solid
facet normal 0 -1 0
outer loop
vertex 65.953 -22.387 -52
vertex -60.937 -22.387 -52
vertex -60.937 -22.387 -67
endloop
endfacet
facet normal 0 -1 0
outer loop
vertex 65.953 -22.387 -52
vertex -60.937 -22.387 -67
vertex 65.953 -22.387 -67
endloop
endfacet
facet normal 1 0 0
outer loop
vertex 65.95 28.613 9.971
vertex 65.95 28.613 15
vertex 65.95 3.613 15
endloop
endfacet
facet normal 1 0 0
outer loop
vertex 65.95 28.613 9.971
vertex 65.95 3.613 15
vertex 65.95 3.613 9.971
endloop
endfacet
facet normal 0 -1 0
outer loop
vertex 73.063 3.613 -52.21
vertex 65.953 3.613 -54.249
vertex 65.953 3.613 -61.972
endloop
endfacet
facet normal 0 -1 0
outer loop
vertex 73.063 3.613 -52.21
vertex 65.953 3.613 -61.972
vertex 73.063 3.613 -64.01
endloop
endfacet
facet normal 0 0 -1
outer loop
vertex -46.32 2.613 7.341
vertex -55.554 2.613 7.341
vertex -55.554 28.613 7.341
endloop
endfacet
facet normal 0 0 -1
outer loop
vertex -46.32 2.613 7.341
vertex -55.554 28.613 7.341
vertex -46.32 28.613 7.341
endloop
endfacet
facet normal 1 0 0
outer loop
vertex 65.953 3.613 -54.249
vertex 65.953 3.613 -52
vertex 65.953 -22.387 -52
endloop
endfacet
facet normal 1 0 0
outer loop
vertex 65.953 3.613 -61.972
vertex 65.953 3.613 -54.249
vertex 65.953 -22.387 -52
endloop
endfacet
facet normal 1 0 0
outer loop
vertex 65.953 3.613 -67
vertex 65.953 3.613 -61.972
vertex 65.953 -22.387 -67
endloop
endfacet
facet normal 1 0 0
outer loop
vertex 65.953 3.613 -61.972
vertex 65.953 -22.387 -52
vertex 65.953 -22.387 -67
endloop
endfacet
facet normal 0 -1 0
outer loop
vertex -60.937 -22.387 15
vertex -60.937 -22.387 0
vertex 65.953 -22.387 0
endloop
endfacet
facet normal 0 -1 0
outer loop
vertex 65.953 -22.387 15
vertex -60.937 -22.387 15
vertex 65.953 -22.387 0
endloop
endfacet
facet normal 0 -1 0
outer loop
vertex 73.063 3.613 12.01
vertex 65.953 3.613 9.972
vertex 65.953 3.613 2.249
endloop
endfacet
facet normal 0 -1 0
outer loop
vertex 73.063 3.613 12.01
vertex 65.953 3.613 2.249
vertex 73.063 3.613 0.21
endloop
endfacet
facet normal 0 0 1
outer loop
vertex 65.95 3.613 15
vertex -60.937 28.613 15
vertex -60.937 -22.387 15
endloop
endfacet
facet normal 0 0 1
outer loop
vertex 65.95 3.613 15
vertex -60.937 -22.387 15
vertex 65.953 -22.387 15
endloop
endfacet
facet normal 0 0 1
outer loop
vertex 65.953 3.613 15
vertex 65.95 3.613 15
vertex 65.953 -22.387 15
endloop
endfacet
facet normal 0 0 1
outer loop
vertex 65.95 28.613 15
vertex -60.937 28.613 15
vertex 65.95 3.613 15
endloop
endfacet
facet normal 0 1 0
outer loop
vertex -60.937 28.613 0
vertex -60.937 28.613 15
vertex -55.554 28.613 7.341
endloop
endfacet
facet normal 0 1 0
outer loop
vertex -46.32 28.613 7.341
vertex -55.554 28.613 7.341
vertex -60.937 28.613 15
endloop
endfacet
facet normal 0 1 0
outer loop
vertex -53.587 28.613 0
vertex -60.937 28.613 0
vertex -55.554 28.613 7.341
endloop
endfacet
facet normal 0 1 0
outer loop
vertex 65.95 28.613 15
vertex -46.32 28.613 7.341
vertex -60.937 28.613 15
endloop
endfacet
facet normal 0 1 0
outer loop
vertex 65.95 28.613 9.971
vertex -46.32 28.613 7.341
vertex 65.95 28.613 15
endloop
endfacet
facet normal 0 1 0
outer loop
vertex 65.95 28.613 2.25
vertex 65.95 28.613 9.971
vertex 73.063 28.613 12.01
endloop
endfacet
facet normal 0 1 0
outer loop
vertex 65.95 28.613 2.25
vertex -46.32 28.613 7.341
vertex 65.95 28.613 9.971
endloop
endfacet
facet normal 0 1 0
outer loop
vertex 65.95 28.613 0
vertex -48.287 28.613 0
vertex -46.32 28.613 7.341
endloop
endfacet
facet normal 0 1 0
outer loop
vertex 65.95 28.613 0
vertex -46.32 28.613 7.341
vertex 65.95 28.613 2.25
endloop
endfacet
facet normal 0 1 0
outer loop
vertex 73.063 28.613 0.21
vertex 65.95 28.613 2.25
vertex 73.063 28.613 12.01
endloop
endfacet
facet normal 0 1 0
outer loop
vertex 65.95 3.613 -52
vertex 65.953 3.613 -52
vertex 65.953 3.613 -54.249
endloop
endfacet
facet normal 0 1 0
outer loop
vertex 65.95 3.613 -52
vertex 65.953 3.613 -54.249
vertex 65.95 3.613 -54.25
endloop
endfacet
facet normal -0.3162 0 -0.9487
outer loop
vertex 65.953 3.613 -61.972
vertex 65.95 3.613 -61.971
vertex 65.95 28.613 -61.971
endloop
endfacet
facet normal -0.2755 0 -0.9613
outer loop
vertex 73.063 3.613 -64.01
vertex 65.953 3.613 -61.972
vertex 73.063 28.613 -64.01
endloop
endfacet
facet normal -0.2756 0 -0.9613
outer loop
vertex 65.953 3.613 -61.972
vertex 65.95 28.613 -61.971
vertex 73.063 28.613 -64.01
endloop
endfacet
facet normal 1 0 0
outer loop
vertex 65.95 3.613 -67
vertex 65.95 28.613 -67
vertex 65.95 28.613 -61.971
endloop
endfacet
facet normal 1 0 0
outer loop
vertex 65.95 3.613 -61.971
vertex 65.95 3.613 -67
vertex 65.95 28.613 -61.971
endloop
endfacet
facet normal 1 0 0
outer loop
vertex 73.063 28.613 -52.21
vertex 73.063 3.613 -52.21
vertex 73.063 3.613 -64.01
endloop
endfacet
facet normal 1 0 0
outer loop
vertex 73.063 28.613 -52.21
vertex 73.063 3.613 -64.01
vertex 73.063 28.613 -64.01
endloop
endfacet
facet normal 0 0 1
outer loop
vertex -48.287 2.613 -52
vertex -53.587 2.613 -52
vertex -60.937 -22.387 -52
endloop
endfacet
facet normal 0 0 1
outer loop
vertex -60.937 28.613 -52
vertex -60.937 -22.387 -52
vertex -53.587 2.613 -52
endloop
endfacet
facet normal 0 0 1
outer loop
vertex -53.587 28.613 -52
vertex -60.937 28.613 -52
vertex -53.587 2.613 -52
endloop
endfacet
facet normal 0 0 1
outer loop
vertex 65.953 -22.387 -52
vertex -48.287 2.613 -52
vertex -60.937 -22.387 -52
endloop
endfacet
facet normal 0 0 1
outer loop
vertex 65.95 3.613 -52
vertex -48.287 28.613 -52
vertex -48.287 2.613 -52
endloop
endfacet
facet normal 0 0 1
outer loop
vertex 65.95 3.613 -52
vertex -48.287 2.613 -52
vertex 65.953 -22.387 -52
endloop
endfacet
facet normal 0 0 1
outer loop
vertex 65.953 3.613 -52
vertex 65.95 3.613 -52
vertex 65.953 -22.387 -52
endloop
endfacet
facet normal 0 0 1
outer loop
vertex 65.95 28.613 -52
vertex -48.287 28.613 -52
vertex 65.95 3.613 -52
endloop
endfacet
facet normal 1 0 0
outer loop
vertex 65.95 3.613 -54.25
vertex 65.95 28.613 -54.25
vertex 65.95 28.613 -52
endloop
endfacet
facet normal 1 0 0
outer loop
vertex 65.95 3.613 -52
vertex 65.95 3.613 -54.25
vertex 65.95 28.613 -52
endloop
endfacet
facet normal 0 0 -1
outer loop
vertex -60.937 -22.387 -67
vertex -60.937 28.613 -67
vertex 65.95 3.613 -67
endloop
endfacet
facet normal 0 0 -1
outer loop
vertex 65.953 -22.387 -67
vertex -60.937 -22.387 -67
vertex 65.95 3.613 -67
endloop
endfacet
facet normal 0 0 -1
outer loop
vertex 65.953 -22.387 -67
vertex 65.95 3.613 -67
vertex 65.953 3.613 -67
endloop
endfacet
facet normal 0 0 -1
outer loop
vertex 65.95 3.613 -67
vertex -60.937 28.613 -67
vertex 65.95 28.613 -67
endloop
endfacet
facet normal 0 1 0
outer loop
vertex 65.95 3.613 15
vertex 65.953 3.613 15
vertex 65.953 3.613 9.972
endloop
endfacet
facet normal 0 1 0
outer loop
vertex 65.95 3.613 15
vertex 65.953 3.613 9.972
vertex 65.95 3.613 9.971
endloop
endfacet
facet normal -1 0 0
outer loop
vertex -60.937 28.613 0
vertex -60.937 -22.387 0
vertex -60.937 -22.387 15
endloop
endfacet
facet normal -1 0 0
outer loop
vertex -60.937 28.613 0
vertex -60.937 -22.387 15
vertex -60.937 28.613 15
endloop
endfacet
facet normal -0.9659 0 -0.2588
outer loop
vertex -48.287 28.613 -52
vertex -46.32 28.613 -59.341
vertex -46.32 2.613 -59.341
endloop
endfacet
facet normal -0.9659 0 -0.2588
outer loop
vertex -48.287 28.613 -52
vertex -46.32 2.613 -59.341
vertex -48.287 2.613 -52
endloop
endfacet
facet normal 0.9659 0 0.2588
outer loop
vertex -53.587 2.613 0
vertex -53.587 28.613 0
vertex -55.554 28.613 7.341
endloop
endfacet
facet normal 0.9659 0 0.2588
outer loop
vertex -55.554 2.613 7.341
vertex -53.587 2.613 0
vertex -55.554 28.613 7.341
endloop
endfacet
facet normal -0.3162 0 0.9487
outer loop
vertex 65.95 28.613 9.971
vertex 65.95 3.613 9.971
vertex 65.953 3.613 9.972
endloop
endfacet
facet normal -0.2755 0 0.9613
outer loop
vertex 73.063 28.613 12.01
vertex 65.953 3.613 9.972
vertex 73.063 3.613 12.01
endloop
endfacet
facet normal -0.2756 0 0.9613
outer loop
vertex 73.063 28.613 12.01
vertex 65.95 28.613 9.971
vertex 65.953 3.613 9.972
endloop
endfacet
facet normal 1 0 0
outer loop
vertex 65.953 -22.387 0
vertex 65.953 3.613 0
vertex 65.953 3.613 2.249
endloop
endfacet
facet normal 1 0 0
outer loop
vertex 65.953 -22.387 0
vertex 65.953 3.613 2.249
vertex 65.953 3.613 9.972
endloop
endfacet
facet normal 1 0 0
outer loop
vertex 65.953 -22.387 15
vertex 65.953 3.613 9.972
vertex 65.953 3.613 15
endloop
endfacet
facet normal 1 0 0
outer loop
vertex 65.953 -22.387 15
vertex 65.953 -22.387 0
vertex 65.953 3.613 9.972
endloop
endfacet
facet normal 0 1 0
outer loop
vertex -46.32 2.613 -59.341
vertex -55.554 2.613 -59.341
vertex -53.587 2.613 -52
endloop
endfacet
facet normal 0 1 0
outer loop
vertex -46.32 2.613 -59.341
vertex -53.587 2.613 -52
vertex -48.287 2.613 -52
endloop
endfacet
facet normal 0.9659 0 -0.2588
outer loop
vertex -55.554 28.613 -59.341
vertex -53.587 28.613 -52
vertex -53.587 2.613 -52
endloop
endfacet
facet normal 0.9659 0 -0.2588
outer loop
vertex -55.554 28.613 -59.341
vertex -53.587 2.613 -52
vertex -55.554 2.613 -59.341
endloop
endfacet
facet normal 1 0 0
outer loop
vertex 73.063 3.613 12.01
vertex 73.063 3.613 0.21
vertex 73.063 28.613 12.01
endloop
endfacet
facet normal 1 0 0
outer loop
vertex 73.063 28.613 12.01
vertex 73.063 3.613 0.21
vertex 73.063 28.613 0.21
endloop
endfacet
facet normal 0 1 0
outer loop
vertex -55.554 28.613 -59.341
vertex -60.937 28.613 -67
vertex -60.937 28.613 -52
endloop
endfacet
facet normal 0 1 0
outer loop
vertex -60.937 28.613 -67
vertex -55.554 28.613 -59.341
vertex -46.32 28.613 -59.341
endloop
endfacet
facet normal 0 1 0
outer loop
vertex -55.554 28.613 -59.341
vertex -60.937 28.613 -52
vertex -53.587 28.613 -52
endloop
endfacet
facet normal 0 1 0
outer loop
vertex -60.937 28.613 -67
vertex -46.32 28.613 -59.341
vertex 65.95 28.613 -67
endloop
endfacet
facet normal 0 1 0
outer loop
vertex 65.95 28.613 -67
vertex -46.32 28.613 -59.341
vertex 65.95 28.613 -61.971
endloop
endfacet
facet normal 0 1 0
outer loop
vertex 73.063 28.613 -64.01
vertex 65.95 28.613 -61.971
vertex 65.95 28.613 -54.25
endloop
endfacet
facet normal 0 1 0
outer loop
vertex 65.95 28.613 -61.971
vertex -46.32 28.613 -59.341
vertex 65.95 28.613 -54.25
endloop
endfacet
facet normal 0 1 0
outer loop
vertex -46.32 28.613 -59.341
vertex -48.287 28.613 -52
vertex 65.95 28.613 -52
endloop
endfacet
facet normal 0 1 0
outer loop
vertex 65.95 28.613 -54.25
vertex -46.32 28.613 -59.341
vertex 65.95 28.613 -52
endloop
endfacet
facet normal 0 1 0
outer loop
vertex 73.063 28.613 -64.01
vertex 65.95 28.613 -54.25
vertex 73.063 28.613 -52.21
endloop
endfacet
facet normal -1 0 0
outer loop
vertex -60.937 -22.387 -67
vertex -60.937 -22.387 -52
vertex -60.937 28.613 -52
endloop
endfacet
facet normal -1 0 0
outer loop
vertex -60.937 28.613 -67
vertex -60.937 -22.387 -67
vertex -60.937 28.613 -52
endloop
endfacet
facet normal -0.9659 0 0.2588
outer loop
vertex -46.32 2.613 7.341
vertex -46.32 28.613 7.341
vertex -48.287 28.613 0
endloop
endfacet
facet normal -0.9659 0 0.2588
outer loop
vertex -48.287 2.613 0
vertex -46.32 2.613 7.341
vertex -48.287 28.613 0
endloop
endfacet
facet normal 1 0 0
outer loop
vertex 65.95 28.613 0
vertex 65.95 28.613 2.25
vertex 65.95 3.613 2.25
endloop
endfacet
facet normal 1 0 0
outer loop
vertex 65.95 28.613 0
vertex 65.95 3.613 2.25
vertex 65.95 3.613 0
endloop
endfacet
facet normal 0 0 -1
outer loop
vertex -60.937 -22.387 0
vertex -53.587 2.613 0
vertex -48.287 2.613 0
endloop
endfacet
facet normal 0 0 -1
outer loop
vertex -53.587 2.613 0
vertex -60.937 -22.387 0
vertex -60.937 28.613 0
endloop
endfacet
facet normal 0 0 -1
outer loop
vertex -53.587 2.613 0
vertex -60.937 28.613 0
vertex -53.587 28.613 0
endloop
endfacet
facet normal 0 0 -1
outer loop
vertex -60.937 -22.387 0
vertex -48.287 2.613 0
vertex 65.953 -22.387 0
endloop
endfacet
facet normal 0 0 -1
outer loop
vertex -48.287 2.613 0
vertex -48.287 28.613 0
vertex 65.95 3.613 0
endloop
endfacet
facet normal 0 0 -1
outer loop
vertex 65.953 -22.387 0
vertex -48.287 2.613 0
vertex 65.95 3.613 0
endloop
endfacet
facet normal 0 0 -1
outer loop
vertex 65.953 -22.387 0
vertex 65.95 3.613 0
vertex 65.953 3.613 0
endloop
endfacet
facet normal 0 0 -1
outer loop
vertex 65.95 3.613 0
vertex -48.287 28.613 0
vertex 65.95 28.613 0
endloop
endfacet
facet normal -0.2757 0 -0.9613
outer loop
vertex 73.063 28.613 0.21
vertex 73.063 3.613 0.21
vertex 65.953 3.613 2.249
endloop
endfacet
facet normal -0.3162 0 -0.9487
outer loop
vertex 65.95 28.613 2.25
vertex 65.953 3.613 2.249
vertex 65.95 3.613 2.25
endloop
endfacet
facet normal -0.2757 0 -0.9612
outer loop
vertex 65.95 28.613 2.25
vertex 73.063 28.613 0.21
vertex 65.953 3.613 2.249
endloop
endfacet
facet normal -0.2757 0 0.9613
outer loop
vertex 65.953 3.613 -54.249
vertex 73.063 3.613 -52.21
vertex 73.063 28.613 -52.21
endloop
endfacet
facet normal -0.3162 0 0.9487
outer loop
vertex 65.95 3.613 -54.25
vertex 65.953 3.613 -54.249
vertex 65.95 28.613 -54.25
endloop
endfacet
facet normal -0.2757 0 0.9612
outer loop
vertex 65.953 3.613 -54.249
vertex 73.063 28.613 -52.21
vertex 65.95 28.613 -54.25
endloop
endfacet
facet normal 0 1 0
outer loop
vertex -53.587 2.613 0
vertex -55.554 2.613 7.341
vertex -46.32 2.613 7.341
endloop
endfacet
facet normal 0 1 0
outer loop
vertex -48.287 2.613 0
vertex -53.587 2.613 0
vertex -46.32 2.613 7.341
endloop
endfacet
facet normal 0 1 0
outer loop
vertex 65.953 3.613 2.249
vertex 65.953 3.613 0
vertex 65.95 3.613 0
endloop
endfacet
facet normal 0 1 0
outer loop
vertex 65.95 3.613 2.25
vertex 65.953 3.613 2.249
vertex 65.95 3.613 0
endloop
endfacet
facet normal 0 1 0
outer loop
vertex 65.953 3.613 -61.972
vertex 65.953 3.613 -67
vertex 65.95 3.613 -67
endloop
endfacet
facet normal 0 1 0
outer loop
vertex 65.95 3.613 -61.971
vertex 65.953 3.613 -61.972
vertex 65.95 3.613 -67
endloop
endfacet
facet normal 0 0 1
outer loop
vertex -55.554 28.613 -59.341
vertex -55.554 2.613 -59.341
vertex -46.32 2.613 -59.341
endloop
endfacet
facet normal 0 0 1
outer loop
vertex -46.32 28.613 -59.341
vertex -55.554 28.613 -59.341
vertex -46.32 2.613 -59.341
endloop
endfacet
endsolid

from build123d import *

# Parameters (mm, degrees)
SKETCH1_W               = 134
SKETCH1_H               = 51
BOSS_EXTRUDE1_DEPTH     = 15
CUT_EXTRUDE2_DEPTH      = 1
CUT_EXTRUDE2_DEPTH_BACK = 26
CUT_EXTRUDE4_DEPTH      = 25
SKETCH7_W               = 7.11
SKETCH7_H               = 15
CUT_EXTRUDE5_DEPTH      = 26


with BuildPart() as part:
    # Sketch1 → Boss-Extrude1 (new body)
    with BuildSketch(Plane.XY):
        with Locations((6.063380282, 3.112676056)):
            Rectangle(SKETCH1_W, SKETCH1_H)
    extrude(amount=BOSS_EXTRUDE1_DEPTH)

    # Sketch3 → Cut-Extrude2 (cut, two sides)
    with BuildSketch(Plane(origin=(0, 28.612676056, 0), x_dir=(1, 0, 0), z_dir=(0, 1, 0))) as cut_extrude2_sk:
        Polygon((-340.610496837, 0), (-60.936619718, 0), (-53.586619718, 0), (-55.553644461, -7.34103628), (-46.319594976, -7.34103628), (-48.286619718, 0), (-120.671545534, 270.144220847), (-554.437861933, 623.29672746), (-774.376813236, 353.152506613), align=None)
    extrude(amount=CUT_EXTRUDE2_DEPTH, mode=Mode.SUBTRACT)
    extrude(cut_extrude2_sk.sketch, amount=-CUT_EXTRUDE2_DEPTH_BACK, mode=Mode.SUBTRACT)

    # Sketch5 → Cut-Extrude4 (cut)
    with BuildSketch(Plane(origin=(0, 28.612676056, 0), x_dir=(1, 0, 0), z_dir=(0, 1, 0))):
        Polygon((65.950043732, 0), (73.063380282, 0), (73.063380282, -0.210283567), (65.950043732, -2.25), align=None)
        Polygon((65.950043732, -15), (65.950043732, -9.970567134), (73.063380282, -12.010283567), (73.063380282, -15), align=None)
    extrude(amount=-CUT_EXTRUDE4_DEPTH, mode=Mode.SUBTRACT)

    # Sketch7 → Cut-Extrude5 (cut)
    with BuildSketch(Plane.XZ.offset(22.387323944)):
        with Locations((69.508380282, 7.5)):
            Rectangle(SKETCH7_W, SKETCH7_H)
    extrude(amount=-CUT_EXTRUDE5_DEPTH, mode=Mode.SUBTRACT)


with BuildPart() as body_2:
    # Mirror2: mirrored copy
    add(part.part.mirror(Plane(origin=(0, 0, -26), x_dir=(1, 0, 0), z_dir=(0, 0, -1))))


solid = Compound([part.part, body_2.part])
